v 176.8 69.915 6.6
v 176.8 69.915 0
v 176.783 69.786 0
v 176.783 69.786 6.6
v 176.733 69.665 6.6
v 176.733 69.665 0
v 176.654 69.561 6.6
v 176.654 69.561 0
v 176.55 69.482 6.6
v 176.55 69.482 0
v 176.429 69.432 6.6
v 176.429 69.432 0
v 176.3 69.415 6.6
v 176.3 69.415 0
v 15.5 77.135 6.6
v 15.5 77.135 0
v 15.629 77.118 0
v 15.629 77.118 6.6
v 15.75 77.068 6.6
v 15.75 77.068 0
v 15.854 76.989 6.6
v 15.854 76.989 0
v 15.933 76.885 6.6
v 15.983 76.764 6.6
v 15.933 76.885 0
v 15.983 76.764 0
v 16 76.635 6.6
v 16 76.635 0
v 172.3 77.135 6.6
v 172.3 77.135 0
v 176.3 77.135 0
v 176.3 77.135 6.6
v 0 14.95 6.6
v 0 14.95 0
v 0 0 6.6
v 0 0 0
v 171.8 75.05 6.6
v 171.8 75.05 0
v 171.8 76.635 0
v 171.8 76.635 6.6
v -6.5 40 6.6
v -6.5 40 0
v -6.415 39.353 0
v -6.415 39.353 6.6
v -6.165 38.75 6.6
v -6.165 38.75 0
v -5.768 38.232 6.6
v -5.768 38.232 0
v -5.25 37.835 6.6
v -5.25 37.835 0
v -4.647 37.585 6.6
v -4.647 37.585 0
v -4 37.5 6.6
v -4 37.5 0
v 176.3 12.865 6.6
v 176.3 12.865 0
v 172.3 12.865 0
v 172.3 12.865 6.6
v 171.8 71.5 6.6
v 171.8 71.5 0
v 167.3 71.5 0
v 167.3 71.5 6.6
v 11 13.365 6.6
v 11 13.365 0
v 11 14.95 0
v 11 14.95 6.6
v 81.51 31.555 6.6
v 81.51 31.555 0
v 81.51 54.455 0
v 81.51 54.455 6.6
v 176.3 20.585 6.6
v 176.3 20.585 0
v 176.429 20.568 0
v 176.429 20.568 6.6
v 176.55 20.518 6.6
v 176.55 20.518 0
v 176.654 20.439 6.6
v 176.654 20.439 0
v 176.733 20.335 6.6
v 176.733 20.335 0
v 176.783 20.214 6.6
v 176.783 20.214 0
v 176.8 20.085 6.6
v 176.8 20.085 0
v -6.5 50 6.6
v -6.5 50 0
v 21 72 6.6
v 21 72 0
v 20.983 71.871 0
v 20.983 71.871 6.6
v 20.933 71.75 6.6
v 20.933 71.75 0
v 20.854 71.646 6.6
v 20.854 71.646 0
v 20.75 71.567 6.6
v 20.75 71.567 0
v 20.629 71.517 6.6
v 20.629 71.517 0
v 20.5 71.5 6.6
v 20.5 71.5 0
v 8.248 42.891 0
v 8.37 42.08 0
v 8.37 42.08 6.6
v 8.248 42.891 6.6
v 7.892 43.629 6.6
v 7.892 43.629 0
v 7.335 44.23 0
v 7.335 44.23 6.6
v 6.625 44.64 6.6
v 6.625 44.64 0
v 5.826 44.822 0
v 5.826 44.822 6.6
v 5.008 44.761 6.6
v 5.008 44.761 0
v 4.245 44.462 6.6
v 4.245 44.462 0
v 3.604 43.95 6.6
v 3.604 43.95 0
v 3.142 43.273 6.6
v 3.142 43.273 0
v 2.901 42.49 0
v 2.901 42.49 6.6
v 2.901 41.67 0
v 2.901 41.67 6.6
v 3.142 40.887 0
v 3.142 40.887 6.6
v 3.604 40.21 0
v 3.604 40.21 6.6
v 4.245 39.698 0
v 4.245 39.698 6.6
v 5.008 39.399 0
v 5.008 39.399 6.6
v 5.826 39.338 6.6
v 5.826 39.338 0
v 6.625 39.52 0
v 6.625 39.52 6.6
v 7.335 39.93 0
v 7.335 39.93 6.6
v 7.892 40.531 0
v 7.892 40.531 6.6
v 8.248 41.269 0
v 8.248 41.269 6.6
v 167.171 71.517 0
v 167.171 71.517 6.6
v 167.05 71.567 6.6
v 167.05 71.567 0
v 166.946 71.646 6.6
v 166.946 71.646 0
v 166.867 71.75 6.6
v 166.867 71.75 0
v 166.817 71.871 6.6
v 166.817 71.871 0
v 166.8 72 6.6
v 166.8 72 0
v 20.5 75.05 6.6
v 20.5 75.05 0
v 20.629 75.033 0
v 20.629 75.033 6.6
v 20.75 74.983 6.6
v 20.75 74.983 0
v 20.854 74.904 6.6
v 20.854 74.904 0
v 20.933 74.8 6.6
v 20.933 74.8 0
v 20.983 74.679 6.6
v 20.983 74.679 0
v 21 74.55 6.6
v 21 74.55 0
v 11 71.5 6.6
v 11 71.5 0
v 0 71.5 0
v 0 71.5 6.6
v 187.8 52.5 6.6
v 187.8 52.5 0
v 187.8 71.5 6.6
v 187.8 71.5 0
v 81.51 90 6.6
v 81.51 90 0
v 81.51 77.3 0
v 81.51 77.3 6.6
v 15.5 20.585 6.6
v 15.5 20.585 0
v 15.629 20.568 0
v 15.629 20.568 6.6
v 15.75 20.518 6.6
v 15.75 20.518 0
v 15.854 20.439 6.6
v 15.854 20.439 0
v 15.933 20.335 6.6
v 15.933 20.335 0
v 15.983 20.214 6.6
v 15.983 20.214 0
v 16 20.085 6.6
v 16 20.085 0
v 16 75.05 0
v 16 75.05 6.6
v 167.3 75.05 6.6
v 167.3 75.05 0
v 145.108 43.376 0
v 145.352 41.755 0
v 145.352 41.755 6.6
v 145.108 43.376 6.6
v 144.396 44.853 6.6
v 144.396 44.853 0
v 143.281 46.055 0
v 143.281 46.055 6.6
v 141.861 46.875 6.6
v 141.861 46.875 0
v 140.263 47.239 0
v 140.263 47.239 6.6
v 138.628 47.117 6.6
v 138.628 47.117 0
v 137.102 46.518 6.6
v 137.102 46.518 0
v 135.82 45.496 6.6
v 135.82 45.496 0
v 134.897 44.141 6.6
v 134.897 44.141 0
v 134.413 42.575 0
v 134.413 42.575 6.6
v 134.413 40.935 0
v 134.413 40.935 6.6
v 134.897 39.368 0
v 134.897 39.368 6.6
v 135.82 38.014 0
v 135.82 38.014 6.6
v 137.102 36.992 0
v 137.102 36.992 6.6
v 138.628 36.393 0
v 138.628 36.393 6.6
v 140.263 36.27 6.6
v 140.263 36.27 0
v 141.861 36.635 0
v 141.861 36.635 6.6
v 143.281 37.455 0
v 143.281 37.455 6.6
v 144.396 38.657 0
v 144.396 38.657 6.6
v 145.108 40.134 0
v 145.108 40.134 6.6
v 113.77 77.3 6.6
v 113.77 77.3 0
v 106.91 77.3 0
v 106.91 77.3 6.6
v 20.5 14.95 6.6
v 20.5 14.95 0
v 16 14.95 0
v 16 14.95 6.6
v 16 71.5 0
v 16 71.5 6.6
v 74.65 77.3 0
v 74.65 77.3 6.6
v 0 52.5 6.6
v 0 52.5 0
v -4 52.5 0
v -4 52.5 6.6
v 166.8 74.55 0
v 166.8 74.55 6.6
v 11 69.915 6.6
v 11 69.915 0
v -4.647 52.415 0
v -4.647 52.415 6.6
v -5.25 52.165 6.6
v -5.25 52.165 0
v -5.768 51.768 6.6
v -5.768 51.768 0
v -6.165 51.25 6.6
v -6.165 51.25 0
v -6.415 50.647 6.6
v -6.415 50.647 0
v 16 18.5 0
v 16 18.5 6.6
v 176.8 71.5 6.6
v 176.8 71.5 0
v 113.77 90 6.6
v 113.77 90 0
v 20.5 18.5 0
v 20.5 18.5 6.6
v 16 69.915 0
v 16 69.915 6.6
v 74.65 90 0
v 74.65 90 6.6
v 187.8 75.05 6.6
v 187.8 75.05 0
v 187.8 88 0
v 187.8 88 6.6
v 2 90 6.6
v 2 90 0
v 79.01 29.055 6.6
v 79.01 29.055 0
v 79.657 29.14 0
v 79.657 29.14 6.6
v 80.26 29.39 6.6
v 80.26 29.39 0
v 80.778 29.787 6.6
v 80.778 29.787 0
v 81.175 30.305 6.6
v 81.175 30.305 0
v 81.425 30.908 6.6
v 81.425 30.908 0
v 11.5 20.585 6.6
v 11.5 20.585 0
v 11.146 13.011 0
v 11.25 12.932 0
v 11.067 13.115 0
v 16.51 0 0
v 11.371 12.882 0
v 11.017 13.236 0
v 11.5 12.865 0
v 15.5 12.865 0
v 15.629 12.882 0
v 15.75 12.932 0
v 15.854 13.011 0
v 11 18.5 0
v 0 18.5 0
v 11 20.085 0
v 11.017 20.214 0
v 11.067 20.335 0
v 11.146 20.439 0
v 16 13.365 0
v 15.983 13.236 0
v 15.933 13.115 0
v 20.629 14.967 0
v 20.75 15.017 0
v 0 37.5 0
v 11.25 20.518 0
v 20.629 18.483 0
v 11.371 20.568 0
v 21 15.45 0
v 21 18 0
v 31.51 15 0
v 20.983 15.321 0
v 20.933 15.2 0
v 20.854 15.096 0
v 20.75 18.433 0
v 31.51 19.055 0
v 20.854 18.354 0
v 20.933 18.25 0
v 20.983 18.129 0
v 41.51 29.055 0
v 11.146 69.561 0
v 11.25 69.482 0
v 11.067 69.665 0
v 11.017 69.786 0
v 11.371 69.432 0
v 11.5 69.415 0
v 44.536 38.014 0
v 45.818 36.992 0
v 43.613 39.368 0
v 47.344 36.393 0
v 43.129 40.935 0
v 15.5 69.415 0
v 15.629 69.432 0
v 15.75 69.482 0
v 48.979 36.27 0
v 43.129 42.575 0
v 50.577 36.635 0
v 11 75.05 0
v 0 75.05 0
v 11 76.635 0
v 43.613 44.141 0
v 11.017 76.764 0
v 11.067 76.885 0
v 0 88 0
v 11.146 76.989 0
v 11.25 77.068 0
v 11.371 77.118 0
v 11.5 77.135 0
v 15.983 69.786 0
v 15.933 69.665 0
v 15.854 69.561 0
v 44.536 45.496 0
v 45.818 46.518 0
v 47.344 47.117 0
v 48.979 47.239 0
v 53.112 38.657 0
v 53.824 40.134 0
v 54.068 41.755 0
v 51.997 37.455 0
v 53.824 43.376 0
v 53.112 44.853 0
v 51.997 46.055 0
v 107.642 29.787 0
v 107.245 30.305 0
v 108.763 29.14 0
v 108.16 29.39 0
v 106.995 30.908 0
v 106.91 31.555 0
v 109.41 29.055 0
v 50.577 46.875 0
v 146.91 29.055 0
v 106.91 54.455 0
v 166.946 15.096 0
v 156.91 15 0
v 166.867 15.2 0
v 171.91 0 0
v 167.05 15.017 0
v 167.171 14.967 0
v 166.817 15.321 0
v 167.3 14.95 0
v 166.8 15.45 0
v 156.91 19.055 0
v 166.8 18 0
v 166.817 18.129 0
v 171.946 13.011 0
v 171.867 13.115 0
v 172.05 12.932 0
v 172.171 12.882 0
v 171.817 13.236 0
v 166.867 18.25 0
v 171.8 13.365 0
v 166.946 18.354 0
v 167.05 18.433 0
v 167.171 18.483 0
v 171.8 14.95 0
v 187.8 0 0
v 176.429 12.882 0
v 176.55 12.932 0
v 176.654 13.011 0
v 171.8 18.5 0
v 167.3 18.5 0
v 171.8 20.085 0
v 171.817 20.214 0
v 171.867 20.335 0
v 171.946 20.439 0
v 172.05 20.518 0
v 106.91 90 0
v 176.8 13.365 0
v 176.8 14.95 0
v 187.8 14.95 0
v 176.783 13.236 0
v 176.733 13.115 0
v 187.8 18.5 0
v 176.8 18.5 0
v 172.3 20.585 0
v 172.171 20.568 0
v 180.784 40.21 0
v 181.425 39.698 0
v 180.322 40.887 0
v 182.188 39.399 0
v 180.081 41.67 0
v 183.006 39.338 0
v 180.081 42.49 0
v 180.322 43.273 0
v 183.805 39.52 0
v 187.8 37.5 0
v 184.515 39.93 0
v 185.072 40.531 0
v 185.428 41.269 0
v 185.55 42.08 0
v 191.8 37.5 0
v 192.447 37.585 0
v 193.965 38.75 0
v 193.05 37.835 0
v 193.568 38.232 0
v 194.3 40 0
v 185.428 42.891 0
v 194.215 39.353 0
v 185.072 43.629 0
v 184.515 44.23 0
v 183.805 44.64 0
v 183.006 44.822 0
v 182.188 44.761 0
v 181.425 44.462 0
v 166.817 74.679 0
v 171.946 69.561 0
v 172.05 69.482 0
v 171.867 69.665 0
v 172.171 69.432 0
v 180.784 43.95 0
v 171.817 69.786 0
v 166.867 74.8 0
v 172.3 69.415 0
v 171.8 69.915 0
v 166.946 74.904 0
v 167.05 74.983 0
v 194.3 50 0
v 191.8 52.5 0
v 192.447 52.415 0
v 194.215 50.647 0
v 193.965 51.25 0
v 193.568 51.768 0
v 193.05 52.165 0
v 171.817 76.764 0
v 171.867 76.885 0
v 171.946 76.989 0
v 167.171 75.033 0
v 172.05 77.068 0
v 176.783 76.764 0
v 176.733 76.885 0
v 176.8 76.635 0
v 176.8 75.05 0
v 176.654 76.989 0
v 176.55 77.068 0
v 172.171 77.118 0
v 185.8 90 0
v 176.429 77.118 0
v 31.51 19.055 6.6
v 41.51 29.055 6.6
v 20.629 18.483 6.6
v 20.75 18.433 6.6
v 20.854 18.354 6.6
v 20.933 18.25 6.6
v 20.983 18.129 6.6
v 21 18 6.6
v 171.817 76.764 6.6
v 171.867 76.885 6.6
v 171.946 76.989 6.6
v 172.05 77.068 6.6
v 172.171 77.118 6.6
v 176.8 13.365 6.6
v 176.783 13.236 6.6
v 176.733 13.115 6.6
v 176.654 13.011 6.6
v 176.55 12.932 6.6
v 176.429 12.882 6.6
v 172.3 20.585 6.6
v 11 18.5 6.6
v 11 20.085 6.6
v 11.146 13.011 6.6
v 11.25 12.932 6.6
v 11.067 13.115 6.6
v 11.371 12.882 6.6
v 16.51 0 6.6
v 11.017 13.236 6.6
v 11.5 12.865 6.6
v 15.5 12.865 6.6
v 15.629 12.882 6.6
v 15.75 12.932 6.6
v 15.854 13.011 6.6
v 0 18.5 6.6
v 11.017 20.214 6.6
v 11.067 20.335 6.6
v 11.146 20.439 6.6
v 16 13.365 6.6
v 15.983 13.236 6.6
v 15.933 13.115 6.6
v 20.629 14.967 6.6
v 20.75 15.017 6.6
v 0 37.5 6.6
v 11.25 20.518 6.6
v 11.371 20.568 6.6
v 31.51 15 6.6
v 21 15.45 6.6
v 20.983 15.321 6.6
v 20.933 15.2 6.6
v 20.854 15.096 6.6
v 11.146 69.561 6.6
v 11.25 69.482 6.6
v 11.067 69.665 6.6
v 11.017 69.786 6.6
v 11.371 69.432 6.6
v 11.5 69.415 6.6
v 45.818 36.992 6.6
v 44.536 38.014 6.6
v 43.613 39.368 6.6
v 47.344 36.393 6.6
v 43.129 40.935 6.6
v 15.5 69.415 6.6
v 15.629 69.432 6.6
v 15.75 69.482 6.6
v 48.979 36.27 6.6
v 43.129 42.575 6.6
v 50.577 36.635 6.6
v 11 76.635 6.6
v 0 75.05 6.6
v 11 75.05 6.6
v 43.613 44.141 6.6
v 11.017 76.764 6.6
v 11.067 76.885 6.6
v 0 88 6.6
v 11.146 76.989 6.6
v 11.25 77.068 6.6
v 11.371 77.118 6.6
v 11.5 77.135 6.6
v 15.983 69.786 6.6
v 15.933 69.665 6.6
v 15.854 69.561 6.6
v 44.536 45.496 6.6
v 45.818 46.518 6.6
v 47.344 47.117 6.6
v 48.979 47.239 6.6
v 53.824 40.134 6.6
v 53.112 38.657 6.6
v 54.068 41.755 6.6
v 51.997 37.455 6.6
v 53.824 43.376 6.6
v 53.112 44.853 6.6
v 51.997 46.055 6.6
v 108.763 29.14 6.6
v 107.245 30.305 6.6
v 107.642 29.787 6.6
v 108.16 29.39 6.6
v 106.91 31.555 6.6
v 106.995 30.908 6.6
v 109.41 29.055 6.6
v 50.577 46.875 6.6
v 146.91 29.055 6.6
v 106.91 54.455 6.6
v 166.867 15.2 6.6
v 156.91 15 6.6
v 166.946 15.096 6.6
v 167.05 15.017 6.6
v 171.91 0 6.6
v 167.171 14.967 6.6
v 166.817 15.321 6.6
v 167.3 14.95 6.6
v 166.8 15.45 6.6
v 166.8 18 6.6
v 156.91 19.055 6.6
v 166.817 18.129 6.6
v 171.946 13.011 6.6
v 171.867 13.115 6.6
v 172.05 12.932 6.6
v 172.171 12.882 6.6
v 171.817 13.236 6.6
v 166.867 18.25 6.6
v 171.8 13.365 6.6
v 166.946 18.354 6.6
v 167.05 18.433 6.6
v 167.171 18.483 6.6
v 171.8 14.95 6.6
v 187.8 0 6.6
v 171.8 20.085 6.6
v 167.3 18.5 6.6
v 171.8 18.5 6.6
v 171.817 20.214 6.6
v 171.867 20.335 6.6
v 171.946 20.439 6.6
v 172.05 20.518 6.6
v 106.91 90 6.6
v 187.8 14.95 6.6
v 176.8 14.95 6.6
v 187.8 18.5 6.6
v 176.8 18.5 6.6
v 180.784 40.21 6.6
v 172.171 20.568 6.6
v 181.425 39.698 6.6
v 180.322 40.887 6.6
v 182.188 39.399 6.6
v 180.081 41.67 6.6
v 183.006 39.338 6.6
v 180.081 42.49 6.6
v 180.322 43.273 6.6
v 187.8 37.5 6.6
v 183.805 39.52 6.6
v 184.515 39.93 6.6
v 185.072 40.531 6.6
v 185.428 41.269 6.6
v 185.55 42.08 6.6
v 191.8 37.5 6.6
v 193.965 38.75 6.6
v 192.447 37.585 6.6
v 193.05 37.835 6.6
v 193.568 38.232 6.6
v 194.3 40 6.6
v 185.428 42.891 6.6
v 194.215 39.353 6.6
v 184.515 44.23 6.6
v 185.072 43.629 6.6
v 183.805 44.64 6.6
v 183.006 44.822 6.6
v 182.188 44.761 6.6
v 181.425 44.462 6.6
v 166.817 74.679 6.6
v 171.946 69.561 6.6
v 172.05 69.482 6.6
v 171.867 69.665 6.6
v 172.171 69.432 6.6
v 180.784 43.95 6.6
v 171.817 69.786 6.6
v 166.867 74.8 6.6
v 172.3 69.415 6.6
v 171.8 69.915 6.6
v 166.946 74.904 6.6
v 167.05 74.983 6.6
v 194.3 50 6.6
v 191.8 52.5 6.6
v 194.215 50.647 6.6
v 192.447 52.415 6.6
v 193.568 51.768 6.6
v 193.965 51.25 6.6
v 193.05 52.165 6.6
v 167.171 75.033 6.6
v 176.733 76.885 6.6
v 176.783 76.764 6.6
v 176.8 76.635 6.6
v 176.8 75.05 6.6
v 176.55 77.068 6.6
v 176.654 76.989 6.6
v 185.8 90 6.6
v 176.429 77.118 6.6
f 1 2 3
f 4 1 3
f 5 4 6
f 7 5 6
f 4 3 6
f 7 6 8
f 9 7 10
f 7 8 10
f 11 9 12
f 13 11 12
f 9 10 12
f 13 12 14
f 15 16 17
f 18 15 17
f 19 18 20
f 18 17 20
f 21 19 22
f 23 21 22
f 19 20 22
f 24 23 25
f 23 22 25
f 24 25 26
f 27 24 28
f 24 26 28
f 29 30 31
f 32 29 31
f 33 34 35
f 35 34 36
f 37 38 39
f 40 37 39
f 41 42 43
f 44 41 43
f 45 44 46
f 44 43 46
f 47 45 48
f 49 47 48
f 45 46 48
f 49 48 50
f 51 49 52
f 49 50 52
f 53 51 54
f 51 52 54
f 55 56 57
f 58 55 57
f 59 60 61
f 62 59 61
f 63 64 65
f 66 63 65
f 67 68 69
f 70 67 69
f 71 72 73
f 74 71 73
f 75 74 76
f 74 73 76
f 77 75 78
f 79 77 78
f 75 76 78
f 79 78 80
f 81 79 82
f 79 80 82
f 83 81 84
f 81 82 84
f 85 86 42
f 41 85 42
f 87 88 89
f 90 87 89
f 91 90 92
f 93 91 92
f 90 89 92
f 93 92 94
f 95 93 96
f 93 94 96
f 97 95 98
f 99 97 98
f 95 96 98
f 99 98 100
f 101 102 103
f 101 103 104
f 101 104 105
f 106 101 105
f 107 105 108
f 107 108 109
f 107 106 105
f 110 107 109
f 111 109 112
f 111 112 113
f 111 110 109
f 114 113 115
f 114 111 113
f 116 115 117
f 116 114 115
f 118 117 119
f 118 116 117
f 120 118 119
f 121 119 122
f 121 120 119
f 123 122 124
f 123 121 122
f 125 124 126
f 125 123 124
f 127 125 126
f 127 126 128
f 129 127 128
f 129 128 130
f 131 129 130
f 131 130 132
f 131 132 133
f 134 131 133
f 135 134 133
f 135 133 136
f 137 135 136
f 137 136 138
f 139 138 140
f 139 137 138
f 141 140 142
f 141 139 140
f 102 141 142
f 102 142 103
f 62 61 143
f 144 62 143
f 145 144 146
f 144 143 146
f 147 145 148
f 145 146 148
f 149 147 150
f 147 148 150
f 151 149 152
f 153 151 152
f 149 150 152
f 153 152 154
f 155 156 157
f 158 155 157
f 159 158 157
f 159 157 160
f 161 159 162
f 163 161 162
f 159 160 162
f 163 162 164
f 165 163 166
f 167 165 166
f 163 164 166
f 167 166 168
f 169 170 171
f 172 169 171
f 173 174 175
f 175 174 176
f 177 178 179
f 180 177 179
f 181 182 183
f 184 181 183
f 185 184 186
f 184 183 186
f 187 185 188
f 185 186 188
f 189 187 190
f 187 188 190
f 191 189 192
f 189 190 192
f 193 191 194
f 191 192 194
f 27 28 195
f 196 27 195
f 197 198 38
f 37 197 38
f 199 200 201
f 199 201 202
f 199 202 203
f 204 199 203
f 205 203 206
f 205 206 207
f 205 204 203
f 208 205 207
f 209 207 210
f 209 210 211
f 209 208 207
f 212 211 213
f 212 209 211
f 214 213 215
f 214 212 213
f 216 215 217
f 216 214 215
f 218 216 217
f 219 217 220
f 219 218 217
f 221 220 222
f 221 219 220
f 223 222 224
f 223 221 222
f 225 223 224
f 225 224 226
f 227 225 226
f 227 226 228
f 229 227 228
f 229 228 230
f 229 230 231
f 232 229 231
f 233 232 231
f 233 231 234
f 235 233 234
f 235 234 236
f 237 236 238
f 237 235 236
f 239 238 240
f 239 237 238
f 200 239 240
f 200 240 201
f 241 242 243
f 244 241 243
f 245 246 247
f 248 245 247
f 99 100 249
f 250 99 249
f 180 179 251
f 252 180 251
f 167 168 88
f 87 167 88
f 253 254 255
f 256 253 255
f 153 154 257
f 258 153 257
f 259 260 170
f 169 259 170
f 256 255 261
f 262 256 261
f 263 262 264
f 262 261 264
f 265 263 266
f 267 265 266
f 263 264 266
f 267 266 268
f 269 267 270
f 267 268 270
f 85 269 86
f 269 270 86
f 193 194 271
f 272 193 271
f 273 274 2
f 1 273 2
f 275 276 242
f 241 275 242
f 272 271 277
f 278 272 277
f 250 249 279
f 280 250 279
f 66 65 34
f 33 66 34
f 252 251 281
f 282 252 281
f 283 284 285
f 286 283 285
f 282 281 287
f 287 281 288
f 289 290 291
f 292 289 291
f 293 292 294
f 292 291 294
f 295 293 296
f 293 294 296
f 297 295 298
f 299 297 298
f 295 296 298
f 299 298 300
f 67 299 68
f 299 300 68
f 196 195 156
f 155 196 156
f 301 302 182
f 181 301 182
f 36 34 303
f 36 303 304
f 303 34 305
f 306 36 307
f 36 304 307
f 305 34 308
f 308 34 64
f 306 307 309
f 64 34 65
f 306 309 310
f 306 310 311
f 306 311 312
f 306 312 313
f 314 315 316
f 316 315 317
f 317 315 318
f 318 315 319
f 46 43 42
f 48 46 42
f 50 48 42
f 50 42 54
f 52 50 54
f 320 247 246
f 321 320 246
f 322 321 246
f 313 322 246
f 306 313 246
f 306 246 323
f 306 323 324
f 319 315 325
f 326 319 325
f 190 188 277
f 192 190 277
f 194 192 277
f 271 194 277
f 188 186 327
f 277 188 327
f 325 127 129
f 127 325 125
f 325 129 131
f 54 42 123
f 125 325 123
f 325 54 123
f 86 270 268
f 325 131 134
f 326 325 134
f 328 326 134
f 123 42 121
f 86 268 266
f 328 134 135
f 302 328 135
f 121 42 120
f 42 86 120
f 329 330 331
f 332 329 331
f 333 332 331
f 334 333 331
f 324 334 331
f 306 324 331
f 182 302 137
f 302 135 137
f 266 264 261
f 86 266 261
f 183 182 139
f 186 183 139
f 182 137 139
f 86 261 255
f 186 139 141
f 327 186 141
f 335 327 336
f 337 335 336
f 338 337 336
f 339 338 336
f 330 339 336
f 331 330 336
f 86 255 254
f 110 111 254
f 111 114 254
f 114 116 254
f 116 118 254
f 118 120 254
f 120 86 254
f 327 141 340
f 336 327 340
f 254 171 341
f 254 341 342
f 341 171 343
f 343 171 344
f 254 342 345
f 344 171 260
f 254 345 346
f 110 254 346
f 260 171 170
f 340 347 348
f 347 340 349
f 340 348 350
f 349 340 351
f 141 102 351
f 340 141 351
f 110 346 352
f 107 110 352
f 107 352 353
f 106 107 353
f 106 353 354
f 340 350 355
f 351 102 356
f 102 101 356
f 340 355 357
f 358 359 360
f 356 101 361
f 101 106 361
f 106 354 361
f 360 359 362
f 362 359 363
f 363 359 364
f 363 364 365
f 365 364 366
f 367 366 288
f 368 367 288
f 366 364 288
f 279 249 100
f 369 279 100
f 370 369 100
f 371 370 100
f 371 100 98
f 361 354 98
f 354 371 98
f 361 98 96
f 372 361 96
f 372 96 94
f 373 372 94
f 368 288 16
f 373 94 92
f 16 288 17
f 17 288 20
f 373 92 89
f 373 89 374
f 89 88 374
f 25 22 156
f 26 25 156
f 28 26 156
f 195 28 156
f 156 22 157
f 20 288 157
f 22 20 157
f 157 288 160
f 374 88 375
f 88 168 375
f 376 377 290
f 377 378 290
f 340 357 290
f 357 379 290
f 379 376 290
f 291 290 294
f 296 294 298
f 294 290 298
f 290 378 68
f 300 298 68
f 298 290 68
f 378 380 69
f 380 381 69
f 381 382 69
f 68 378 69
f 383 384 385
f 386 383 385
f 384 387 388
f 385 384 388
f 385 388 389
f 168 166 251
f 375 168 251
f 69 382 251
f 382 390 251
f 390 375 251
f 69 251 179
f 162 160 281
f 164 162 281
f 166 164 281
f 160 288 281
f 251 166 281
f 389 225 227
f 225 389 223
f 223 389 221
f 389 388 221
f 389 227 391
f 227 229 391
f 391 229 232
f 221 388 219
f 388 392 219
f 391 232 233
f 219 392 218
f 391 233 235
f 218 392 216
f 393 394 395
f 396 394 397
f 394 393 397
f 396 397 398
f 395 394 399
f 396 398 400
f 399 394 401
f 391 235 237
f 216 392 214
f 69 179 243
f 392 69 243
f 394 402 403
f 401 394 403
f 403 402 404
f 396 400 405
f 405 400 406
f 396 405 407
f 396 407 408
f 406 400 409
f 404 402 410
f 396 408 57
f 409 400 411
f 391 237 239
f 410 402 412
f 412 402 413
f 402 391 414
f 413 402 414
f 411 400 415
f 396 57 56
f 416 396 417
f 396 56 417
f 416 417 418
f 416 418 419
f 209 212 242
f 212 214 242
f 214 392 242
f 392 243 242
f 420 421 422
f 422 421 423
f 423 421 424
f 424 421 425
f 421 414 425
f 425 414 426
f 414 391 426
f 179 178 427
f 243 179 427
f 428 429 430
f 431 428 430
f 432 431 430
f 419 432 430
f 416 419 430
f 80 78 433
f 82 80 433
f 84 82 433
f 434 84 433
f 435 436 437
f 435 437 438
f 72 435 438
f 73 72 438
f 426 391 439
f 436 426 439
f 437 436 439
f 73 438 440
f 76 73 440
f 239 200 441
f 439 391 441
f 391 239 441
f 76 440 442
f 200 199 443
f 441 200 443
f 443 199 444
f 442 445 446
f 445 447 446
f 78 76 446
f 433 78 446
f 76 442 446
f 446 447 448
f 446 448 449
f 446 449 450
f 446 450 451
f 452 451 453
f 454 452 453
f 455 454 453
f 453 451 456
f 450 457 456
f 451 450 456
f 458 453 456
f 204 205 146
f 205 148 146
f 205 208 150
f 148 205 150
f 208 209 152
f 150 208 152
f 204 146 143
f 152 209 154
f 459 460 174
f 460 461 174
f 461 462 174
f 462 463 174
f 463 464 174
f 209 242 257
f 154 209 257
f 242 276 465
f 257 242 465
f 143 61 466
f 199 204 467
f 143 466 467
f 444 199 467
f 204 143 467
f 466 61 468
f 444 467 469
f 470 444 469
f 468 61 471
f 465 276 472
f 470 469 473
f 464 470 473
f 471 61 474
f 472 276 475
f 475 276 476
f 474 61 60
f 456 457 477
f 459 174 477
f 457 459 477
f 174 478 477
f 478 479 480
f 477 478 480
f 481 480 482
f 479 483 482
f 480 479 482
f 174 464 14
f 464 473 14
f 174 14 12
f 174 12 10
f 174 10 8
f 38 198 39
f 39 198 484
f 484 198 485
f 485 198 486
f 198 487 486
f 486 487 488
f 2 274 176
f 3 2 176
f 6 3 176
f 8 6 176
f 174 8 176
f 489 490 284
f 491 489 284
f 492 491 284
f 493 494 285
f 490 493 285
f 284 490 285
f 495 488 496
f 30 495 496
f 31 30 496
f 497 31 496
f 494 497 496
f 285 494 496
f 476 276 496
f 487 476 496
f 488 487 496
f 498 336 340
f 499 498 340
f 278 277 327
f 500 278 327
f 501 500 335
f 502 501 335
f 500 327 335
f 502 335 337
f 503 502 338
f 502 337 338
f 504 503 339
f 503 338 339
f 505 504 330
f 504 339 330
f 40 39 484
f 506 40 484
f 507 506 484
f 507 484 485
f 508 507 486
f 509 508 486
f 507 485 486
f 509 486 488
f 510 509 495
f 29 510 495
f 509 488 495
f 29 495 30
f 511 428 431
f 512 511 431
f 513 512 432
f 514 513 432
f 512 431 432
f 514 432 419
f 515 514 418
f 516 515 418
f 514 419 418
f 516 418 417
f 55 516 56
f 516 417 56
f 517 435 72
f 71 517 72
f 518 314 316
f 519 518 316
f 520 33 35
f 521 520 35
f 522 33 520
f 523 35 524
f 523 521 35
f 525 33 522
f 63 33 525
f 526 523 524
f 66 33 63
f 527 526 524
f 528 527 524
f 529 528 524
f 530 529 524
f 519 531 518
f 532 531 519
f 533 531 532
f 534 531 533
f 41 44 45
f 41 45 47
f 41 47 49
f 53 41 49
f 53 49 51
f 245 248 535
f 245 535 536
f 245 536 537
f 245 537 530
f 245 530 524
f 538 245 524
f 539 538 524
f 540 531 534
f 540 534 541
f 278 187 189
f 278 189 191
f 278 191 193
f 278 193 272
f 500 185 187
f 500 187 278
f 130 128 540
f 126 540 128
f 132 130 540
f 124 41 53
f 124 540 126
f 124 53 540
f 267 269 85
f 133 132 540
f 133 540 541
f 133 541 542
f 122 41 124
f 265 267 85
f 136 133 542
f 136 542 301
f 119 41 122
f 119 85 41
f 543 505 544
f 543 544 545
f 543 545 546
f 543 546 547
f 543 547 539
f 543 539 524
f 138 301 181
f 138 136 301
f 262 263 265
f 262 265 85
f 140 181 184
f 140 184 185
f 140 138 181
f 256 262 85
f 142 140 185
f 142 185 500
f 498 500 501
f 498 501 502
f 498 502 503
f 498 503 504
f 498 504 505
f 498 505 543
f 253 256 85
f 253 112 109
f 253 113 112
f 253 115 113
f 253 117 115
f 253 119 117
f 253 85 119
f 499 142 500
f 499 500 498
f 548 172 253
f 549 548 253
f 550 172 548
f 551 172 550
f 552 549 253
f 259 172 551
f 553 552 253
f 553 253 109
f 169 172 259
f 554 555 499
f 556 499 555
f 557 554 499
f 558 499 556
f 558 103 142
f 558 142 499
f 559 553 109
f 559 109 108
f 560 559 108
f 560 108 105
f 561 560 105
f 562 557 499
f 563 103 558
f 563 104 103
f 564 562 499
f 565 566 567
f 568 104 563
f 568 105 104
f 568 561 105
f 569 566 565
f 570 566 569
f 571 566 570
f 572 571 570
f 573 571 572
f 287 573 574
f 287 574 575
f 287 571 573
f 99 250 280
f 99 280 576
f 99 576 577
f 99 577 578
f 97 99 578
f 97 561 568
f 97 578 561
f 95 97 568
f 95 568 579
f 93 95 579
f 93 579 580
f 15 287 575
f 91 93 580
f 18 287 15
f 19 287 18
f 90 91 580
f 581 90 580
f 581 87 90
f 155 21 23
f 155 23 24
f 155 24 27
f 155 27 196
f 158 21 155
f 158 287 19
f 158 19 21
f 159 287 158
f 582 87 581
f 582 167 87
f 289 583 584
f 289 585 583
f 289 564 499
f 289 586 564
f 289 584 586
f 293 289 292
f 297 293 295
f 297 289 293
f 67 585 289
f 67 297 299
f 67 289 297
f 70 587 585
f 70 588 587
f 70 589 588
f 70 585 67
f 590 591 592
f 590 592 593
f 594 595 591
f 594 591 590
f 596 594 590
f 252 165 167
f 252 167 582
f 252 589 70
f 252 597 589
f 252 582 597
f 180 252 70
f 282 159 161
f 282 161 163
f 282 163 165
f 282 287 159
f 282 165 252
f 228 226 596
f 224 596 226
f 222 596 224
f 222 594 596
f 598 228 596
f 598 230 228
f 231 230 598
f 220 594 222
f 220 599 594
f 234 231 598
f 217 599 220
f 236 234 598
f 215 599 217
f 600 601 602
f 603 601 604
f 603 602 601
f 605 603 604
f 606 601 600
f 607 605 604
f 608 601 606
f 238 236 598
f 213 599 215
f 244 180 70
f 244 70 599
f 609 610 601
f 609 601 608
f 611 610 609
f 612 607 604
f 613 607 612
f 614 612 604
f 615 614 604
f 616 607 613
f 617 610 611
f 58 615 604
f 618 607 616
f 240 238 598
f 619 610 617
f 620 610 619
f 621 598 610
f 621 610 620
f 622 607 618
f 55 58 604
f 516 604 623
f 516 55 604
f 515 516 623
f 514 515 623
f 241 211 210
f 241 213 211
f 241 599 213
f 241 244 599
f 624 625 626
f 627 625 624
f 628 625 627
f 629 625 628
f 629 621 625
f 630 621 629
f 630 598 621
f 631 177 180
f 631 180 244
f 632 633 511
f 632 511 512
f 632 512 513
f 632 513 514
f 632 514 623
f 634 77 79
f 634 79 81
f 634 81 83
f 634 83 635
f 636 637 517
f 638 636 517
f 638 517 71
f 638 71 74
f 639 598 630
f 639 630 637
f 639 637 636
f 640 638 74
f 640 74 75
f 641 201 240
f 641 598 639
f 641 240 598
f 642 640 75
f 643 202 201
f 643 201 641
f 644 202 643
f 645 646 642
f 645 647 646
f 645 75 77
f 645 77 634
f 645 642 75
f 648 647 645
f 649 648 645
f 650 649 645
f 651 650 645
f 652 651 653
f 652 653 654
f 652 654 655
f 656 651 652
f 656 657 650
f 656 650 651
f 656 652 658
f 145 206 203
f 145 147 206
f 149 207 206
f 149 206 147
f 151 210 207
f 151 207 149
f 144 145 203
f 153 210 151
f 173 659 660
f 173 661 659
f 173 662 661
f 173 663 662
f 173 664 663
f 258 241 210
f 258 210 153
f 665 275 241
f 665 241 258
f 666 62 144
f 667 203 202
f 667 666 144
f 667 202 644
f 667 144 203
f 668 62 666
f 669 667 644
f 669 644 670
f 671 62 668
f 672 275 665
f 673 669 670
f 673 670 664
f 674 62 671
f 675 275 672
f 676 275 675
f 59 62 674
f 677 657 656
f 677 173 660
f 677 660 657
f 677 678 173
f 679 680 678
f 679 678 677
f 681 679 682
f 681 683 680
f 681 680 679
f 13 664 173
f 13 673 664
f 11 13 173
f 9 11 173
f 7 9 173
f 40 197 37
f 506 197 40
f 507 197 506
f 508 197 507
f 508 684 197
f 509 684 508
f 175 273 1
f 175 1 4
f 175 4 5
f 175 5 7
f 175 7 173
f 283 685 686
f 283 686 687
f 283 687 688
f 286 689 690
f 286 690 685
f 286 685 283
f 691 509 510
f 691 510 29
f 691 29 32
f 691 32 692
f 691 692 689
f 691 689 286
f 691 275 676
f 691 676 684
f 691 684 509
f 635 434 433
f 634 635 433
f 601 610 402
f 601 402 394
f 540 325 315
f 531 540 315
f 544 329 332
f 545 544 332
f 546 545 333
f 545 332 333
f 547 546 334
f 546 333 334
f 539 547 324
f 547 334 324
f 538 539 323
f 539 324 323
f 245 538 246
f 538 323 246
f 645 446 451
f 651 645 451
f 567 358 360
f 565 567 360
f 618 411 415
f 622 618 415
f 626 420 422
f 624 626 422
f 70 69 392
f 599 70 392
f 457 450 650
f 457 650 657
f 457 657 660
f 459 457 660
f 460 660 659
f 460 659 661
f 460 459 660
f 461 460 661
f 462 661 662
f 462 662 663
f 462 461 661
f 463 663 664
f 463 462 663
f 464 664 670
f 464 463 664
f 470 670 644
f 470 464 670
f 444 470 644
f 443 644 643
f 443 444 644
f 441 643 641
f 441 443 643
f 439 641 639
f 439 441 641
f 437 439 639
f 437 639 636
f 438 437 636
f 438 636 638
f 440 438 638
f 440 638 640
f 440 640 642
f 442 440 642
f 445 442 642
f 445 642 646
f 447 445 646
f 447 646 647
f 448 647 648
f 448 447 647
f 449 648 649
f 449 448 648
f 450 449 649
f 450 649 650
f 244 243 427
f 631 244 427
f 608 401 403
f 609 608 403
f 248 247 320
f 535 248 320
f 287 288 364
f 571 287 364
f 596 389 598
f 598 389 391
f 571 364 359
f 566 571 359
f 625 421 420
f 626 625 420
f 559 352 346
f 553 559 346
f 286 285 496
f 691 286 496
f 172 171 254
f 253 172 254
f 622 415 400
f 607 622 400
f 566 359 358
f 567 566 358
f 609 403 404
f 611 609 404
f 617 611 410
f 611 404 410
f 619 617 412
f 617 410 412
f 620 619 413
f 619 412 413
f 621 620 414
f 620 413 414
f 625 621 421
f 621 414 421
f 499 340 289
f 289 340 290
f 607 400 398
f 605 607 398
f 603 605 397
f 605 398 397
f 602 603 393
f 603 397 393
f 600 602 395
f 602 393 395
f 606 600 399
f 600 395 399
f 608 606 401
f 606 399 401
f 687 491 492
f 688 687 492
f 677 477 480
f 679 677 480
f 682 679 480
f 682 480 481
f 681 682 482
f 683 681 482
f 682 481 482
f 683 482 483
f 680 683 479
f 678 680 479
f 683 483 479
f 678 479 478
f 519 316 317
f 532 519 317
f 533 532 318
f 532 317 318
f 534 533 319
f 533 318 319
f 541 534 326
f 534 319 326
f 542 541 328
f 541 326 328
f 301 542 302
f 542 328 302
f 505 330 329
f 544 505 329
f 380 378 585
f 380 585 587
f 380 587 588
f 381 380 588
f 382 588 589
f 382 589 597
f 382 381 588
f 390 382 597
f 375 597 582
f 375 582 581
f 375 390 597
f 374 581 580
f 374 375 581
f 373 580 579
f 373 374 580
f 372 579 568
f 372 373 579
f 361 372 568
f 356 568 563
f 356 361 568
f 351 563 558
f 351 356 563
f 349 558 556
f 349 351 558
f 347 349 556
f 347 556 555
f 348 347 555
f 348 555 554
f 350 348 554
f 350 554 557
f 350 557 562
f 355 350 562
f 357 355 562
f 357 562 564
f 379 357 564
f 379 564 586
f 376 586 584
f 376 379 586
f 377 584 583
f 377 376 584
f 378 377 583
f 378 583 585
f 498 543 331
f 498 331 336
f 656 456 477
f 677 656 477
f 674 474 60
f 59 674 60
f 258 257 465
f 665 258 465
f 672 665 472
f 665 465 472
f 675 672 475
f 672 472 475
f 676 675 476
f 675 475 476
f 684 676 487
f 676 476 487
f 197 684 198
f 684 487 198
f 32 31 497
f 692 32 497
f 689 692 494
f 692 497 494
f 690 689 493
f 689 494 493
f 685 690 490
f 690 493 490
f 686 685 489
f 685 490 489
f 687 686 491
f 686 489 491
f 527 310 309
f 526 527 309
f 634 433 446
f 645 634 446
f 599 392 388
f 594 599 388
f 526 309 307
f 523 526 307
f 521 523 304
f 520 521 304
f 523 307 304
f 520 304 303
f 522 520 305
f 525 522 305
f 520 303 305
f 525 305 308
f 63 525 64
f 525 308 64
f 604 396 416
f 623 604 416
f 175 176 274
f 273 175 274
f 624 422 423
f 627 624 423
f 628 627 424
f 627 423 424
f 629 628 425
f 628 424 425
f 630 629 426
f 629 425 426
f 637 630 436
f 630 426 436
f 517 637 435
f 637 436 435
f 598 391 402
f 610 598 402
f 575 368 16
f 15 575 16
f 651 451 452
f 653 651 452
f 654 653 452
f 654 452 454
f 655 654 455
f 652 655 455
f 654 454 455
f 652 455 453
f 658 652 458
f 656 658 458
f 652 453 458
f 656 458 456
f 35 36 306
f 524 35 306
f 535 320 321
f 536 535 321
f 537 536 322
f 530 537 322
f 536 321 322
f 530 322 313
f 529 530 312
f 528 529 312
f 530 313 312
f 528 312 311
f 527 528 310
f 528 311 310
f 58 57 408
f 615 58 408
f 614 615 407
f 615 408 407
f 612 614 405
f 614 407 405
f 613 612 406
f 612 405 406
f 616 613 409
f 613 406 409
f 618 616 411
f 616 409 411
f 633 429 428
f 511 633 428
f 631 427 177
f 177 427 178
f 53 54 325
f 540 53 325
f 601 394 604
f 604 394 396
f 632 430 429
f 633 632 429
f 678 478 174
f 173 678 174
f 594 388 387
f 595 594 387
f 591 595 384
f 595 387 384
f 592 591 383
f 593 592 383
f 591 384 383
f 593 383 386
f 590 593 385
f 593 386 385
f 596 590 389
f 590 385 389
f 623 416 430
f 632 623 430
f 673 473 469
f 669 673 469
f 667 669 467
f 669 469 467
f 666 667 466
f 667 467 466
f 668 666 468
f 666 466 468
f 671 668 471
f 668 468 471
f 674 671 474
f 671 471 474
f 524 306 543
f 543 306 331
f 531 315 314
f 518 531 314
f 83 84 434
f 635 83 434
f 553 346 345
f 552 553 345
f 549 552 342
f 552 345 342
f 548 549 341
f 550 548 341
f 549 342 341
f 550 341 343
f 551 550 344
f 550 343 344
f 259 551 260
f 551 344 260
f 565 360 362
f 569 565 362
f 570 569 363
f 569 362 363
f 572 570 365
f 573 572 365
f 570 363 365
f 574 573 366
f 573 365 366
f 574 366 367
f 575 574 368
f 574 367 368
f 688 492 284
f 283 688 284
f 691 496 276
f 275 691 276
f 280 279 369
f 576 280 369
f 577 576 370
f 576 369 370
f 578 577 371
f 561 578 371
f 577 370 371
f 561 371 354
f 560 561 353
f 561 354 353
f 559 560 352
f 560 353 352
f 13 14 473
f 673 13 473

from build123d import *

# Parameters (mm, degrees)
MODEL_R             = 5.5
MODEL_R_2           = 2.75
BOSS_EXTRUDE1_DEPTH = 6.6


with BuildPart() as part:
    # Model → Boss-Extrude1 (new body)
    with BuildSketch(Plane.XY):
        with BuildLine():
            Line((146.910001664, 29.054806781), (156.910001664, 19.054806781))
            Line((156.910001664, 19.054806781), (156.910001664, 15))
            Line((156.910001664, 15), (171.910001664, 0))
            Line((171.910001664, 0), (187.8, 0))
            Line((187.8, 0), (187.8, 14.95))
            Line((187.8, 14.95), (176.8, 14.95))
            Line((176.8, 14.95), (176.8, 13.365))
            ThreePointArc((176.8, 13.365), (176.653553391, 13.011446609), (176.3, 12.865))
            Line((176.3, 12.865), (172.3, 12.865))
            ThreePointArc((172.3, 12.865), (171.946446609, 13.011446609), (171.8, 13.365))
            Line((171.8, 13.365), (171.8, 14.95))
            Line((171.8, 14.95), (167.3, 14.95))
            ThreePointArc((167.3, 14.95), (166.946446609, 15.096446609), (166.8, 15.45))
            Line((166.8, 15.45), (166.8, 18))
            ThreePointArc((166.8, 18), (166.946446609, 18.353553391), (167.3, 18.5))
            Line((167.3, 18.5), (171.8, 18.5))
            Line((171.8, 18.5), (171.8, 20.085))
            ThreePointArc((171.8, 20.085), (171.946446609, 20.438553391), (172.3, 20.585))
            Line((172.3, 20.585), (176.3, 20.585))
            ThreePointArc((176.3, 20.585), (176.653553391, 20.438553391), (176.8, 20.085))
            Line((176.8, 20.085), (176.8, 18.5))
            Line((176.8, 18.5), (187.8, 18.5))
            Line((187.8, 18.5), (187.8, 37.5))
            Line((187.8, 37.5), (191.8, 37.5))
            ThreePointArc((191.8, 37.5), (193.567766953, 38.232233047), (194.3, 40))
            Line((194.3, 40), (194.3, 50))
            ThreePointArc((194.3, 50), (193.567766953, 51.767766953), (191.8, 52.5))
            Line((191.8, 52.5), (187.8, 52.5))
            Line((187.8, 52.5), (187.8, 71.5))
            Line((187.8, 71.5), (176.8, 71.5))
            Line((176.8, 71.5), (176.8, 69.915))
            ThreePointArc((176.8, 69.915), (176.653553391, 69.561446609), (176.3, 69.415))
            Line((176.3, 69.415), (172.3, 69.415))
            ThreePointArc((172.3, 69.415), (171.946446609, 69.561446609), (171.8, 69.915))
            Line((171.8, 69.915), (171.8, 71.5))
            Line((171.8, 71.5), (167.3, 71.5))
            ThreePointArc((167.3, 71.5), (166.946446609, 71.646446609), (166.8, 72))
            Line((166.8, 72), (166.8, 74.55))
            ThreePointArc((166.8, 74.55), (166.946446609, 74.903553391), (167.3, 75.05))
            Line((167.3, 75.05), (171.8, 75.05))
            Line((171.8, 75.05), (171.8, 76.635))
            ThreePointArc((171.8, 76.635), (171.946446609, 76.988553391), (172.3, 77.135))
            Line((172.3, 77.135), (176.3, 77.135))
            ThreePointArc((176.3, 77.135), (176.653553391, 76.988553391), (176.8, 76.635))
            Line((176.8, 76.635), (176.8, 75.05))
            Line((176.8, 75.05), (187.8, 75.05))
            Line((187.8, 75.05), (187.8, 88))
            Line((187.8, 88), (185.8, 90))
            Line((185.8, 90), (113.770001664, 90))
            Line((113.770001664, 90), (113.770001664, 77.3))
            Line((113.770001664, 77.3), (106.910001664, 77.3))
            Line((106.910001664, 77.3), (106.910001664, 90))
            Line((106.910001664, 90), (81.510001665, 90))
            Line((81.510001665, 90), (81.510001665, 77.3))
            Line((81.510001665, 77.3), (74.650001665, 77.3))
            Line((74.650001665, 77.3), (74.650001665, 90))
            Line((74.650001665, 90), (2, 90))
            Line((2, 90), (0, 88))
            Line((0, 88), (0, 75.05))
            Line((0, 75.05), (11, 75.05))
            Line((11, 75.05), (11, 76.635))
            ThreePointArc((11, 76.635), (11.146446609, 76.988553391), (11.5, 77.135))
            Line((11.5, 77.135), (15.5, 77.135))
            ThreePointArc((15.5, 77.135), (15.853553391, 76.988553391), (16, 76.635))
            Line((16, 76.635), (16, 75.05))
            Line((16, 75.05), (20.5, 75.05))
            ThreePointArc((20.5, 75.05), (20.853553391, 74.903553391), (21, 74.55))
            Line((21, 74.55), (21, 72))
            ThreePointArc((21, 72), (20.853553391, 71.646446609), (20.5, 71.5))
            Line((20.5, 71.5), (16, 71.5))
            Line((16, 71.5), (16, 69.915))
            ThreePointArc((16, 69.915), (15.853553391, 69.561446609), (15.5, 69.415))
            Line((15.5, 69.415), (11.5, 69.415))
            ThreePointArc((11.5, 69.415), (11.146446609, 69.561446609), (11, 69.915))
            Line((11, 69.915), (11, 71.5))
            Line((11, 71.5), (0, 71.5))
            Line((0, 71.5), (0, 52.5))
            Line((0, 52.5), (-4, 52.5))
            ThreePointArc((-4, 52.5), (-5.767766953, 51.767766953), (-6.5, 50))
            Line((-6.5, 50), (-6.5, 40))
            ThreePointArc((-6.5, 40), (-5.767766953, 38.232233047), (-4, 37.5))
            Line((-4, 37.5), (0, 37.5))
            Line((0, 37.5), (0, 18.5))
            Line((0, 18.5), (11, 18.5))
            Line((11, 18.5), (11, 20.085))
            ThreePointArc((11, 20.085), (11.146446609, 20.438553391), (11.5, 20.585))
            Line((11.5, 20.585), (15.5, 20.585))
            ThreePointArc((15.5, 20.585), (15.853553391, 20.438553391), (16, 20.085))
            Line((16, 20.085), (16, 18.5))
            Line((16, 18.5), (20.5, 18.5))
            ThreePointArc((20.5, 18.5), (20.853553391, 18.353553391), (21, 18))
            Line((21, 18), (21, 15.45))
            ThreePointArc((21, 15.45), (20.853553391, 15.096446609), (20.5, 14.95))
            Line((20.5, 14.95), (16, 14.95))
            Line((16, 14.95), (16, 13.365))
            ThreePointArc((16, 13.365), (15.853553391, 13.011446609), (15.5, 12.865))
            Line((15.5, 12.865), (11.5, 12.865))
            ThreePointArc((11.5, 12.865), (11.146446609, 13.011446609), (11, 13.365))
            Line((11, 13.365), (11, 14.95))
            Line((11, 14.95), (0, 14.95))
            Line((0, 14.95), (0, 0))
            Line((0, 0), (16.510001665, 0))
            Line((16.510001665, 0), (31.510001665, 15))
            Line((31.510001665, 15), (31.510001665, 19.054806781))
            Line((31.510001665, 19.054806781), (41.510001665, 29.054806781))
            Line((41.510001665, 29.054806781), (79.010001665, 29.054806781))
            ThreePointArc((79.010001665, 29.054806781), (80.777768618, 29.787039828), (81.510001665, 31.554806781))
            Line((81.510001665, 31.554806781), (81.510001665, 54.45480678))
            Line((81.510001665, 54.45480678), (106.910001664, 54.45480678))
            Line((106.910001664, 54.45480678), (106.910001664, 31.554806781))
            ThreePointArc((106.910001664, 31.554806781), (107.642234711, 29.787039828), (109.410001664, 29.054806781))
            Line((109.410001664, 29.054806781), (146.910001664, 29.054806781))
        make_face()
        with Locations((139.852001664, 41.754806781)):
            Circle(MODEL_R, mode=Mode.SUBTRACT)
        with Locations((48.568001665, 41.754806781)):
            Circle(MODEL_R, mode=Mode.SUBTRACT)
        with Locations((182.8, 42.08)):
            Circle(MODEL_R_2, mode=Mode.SUBTRACT)
        with Locations((5.62000333, 42.08)):
            Circle(MODEL_R_2, mode=Mode.SUBTRACT)
    extrude(amount=BOSS_EXTRUDE1_DEPTH)


solid = part.part
